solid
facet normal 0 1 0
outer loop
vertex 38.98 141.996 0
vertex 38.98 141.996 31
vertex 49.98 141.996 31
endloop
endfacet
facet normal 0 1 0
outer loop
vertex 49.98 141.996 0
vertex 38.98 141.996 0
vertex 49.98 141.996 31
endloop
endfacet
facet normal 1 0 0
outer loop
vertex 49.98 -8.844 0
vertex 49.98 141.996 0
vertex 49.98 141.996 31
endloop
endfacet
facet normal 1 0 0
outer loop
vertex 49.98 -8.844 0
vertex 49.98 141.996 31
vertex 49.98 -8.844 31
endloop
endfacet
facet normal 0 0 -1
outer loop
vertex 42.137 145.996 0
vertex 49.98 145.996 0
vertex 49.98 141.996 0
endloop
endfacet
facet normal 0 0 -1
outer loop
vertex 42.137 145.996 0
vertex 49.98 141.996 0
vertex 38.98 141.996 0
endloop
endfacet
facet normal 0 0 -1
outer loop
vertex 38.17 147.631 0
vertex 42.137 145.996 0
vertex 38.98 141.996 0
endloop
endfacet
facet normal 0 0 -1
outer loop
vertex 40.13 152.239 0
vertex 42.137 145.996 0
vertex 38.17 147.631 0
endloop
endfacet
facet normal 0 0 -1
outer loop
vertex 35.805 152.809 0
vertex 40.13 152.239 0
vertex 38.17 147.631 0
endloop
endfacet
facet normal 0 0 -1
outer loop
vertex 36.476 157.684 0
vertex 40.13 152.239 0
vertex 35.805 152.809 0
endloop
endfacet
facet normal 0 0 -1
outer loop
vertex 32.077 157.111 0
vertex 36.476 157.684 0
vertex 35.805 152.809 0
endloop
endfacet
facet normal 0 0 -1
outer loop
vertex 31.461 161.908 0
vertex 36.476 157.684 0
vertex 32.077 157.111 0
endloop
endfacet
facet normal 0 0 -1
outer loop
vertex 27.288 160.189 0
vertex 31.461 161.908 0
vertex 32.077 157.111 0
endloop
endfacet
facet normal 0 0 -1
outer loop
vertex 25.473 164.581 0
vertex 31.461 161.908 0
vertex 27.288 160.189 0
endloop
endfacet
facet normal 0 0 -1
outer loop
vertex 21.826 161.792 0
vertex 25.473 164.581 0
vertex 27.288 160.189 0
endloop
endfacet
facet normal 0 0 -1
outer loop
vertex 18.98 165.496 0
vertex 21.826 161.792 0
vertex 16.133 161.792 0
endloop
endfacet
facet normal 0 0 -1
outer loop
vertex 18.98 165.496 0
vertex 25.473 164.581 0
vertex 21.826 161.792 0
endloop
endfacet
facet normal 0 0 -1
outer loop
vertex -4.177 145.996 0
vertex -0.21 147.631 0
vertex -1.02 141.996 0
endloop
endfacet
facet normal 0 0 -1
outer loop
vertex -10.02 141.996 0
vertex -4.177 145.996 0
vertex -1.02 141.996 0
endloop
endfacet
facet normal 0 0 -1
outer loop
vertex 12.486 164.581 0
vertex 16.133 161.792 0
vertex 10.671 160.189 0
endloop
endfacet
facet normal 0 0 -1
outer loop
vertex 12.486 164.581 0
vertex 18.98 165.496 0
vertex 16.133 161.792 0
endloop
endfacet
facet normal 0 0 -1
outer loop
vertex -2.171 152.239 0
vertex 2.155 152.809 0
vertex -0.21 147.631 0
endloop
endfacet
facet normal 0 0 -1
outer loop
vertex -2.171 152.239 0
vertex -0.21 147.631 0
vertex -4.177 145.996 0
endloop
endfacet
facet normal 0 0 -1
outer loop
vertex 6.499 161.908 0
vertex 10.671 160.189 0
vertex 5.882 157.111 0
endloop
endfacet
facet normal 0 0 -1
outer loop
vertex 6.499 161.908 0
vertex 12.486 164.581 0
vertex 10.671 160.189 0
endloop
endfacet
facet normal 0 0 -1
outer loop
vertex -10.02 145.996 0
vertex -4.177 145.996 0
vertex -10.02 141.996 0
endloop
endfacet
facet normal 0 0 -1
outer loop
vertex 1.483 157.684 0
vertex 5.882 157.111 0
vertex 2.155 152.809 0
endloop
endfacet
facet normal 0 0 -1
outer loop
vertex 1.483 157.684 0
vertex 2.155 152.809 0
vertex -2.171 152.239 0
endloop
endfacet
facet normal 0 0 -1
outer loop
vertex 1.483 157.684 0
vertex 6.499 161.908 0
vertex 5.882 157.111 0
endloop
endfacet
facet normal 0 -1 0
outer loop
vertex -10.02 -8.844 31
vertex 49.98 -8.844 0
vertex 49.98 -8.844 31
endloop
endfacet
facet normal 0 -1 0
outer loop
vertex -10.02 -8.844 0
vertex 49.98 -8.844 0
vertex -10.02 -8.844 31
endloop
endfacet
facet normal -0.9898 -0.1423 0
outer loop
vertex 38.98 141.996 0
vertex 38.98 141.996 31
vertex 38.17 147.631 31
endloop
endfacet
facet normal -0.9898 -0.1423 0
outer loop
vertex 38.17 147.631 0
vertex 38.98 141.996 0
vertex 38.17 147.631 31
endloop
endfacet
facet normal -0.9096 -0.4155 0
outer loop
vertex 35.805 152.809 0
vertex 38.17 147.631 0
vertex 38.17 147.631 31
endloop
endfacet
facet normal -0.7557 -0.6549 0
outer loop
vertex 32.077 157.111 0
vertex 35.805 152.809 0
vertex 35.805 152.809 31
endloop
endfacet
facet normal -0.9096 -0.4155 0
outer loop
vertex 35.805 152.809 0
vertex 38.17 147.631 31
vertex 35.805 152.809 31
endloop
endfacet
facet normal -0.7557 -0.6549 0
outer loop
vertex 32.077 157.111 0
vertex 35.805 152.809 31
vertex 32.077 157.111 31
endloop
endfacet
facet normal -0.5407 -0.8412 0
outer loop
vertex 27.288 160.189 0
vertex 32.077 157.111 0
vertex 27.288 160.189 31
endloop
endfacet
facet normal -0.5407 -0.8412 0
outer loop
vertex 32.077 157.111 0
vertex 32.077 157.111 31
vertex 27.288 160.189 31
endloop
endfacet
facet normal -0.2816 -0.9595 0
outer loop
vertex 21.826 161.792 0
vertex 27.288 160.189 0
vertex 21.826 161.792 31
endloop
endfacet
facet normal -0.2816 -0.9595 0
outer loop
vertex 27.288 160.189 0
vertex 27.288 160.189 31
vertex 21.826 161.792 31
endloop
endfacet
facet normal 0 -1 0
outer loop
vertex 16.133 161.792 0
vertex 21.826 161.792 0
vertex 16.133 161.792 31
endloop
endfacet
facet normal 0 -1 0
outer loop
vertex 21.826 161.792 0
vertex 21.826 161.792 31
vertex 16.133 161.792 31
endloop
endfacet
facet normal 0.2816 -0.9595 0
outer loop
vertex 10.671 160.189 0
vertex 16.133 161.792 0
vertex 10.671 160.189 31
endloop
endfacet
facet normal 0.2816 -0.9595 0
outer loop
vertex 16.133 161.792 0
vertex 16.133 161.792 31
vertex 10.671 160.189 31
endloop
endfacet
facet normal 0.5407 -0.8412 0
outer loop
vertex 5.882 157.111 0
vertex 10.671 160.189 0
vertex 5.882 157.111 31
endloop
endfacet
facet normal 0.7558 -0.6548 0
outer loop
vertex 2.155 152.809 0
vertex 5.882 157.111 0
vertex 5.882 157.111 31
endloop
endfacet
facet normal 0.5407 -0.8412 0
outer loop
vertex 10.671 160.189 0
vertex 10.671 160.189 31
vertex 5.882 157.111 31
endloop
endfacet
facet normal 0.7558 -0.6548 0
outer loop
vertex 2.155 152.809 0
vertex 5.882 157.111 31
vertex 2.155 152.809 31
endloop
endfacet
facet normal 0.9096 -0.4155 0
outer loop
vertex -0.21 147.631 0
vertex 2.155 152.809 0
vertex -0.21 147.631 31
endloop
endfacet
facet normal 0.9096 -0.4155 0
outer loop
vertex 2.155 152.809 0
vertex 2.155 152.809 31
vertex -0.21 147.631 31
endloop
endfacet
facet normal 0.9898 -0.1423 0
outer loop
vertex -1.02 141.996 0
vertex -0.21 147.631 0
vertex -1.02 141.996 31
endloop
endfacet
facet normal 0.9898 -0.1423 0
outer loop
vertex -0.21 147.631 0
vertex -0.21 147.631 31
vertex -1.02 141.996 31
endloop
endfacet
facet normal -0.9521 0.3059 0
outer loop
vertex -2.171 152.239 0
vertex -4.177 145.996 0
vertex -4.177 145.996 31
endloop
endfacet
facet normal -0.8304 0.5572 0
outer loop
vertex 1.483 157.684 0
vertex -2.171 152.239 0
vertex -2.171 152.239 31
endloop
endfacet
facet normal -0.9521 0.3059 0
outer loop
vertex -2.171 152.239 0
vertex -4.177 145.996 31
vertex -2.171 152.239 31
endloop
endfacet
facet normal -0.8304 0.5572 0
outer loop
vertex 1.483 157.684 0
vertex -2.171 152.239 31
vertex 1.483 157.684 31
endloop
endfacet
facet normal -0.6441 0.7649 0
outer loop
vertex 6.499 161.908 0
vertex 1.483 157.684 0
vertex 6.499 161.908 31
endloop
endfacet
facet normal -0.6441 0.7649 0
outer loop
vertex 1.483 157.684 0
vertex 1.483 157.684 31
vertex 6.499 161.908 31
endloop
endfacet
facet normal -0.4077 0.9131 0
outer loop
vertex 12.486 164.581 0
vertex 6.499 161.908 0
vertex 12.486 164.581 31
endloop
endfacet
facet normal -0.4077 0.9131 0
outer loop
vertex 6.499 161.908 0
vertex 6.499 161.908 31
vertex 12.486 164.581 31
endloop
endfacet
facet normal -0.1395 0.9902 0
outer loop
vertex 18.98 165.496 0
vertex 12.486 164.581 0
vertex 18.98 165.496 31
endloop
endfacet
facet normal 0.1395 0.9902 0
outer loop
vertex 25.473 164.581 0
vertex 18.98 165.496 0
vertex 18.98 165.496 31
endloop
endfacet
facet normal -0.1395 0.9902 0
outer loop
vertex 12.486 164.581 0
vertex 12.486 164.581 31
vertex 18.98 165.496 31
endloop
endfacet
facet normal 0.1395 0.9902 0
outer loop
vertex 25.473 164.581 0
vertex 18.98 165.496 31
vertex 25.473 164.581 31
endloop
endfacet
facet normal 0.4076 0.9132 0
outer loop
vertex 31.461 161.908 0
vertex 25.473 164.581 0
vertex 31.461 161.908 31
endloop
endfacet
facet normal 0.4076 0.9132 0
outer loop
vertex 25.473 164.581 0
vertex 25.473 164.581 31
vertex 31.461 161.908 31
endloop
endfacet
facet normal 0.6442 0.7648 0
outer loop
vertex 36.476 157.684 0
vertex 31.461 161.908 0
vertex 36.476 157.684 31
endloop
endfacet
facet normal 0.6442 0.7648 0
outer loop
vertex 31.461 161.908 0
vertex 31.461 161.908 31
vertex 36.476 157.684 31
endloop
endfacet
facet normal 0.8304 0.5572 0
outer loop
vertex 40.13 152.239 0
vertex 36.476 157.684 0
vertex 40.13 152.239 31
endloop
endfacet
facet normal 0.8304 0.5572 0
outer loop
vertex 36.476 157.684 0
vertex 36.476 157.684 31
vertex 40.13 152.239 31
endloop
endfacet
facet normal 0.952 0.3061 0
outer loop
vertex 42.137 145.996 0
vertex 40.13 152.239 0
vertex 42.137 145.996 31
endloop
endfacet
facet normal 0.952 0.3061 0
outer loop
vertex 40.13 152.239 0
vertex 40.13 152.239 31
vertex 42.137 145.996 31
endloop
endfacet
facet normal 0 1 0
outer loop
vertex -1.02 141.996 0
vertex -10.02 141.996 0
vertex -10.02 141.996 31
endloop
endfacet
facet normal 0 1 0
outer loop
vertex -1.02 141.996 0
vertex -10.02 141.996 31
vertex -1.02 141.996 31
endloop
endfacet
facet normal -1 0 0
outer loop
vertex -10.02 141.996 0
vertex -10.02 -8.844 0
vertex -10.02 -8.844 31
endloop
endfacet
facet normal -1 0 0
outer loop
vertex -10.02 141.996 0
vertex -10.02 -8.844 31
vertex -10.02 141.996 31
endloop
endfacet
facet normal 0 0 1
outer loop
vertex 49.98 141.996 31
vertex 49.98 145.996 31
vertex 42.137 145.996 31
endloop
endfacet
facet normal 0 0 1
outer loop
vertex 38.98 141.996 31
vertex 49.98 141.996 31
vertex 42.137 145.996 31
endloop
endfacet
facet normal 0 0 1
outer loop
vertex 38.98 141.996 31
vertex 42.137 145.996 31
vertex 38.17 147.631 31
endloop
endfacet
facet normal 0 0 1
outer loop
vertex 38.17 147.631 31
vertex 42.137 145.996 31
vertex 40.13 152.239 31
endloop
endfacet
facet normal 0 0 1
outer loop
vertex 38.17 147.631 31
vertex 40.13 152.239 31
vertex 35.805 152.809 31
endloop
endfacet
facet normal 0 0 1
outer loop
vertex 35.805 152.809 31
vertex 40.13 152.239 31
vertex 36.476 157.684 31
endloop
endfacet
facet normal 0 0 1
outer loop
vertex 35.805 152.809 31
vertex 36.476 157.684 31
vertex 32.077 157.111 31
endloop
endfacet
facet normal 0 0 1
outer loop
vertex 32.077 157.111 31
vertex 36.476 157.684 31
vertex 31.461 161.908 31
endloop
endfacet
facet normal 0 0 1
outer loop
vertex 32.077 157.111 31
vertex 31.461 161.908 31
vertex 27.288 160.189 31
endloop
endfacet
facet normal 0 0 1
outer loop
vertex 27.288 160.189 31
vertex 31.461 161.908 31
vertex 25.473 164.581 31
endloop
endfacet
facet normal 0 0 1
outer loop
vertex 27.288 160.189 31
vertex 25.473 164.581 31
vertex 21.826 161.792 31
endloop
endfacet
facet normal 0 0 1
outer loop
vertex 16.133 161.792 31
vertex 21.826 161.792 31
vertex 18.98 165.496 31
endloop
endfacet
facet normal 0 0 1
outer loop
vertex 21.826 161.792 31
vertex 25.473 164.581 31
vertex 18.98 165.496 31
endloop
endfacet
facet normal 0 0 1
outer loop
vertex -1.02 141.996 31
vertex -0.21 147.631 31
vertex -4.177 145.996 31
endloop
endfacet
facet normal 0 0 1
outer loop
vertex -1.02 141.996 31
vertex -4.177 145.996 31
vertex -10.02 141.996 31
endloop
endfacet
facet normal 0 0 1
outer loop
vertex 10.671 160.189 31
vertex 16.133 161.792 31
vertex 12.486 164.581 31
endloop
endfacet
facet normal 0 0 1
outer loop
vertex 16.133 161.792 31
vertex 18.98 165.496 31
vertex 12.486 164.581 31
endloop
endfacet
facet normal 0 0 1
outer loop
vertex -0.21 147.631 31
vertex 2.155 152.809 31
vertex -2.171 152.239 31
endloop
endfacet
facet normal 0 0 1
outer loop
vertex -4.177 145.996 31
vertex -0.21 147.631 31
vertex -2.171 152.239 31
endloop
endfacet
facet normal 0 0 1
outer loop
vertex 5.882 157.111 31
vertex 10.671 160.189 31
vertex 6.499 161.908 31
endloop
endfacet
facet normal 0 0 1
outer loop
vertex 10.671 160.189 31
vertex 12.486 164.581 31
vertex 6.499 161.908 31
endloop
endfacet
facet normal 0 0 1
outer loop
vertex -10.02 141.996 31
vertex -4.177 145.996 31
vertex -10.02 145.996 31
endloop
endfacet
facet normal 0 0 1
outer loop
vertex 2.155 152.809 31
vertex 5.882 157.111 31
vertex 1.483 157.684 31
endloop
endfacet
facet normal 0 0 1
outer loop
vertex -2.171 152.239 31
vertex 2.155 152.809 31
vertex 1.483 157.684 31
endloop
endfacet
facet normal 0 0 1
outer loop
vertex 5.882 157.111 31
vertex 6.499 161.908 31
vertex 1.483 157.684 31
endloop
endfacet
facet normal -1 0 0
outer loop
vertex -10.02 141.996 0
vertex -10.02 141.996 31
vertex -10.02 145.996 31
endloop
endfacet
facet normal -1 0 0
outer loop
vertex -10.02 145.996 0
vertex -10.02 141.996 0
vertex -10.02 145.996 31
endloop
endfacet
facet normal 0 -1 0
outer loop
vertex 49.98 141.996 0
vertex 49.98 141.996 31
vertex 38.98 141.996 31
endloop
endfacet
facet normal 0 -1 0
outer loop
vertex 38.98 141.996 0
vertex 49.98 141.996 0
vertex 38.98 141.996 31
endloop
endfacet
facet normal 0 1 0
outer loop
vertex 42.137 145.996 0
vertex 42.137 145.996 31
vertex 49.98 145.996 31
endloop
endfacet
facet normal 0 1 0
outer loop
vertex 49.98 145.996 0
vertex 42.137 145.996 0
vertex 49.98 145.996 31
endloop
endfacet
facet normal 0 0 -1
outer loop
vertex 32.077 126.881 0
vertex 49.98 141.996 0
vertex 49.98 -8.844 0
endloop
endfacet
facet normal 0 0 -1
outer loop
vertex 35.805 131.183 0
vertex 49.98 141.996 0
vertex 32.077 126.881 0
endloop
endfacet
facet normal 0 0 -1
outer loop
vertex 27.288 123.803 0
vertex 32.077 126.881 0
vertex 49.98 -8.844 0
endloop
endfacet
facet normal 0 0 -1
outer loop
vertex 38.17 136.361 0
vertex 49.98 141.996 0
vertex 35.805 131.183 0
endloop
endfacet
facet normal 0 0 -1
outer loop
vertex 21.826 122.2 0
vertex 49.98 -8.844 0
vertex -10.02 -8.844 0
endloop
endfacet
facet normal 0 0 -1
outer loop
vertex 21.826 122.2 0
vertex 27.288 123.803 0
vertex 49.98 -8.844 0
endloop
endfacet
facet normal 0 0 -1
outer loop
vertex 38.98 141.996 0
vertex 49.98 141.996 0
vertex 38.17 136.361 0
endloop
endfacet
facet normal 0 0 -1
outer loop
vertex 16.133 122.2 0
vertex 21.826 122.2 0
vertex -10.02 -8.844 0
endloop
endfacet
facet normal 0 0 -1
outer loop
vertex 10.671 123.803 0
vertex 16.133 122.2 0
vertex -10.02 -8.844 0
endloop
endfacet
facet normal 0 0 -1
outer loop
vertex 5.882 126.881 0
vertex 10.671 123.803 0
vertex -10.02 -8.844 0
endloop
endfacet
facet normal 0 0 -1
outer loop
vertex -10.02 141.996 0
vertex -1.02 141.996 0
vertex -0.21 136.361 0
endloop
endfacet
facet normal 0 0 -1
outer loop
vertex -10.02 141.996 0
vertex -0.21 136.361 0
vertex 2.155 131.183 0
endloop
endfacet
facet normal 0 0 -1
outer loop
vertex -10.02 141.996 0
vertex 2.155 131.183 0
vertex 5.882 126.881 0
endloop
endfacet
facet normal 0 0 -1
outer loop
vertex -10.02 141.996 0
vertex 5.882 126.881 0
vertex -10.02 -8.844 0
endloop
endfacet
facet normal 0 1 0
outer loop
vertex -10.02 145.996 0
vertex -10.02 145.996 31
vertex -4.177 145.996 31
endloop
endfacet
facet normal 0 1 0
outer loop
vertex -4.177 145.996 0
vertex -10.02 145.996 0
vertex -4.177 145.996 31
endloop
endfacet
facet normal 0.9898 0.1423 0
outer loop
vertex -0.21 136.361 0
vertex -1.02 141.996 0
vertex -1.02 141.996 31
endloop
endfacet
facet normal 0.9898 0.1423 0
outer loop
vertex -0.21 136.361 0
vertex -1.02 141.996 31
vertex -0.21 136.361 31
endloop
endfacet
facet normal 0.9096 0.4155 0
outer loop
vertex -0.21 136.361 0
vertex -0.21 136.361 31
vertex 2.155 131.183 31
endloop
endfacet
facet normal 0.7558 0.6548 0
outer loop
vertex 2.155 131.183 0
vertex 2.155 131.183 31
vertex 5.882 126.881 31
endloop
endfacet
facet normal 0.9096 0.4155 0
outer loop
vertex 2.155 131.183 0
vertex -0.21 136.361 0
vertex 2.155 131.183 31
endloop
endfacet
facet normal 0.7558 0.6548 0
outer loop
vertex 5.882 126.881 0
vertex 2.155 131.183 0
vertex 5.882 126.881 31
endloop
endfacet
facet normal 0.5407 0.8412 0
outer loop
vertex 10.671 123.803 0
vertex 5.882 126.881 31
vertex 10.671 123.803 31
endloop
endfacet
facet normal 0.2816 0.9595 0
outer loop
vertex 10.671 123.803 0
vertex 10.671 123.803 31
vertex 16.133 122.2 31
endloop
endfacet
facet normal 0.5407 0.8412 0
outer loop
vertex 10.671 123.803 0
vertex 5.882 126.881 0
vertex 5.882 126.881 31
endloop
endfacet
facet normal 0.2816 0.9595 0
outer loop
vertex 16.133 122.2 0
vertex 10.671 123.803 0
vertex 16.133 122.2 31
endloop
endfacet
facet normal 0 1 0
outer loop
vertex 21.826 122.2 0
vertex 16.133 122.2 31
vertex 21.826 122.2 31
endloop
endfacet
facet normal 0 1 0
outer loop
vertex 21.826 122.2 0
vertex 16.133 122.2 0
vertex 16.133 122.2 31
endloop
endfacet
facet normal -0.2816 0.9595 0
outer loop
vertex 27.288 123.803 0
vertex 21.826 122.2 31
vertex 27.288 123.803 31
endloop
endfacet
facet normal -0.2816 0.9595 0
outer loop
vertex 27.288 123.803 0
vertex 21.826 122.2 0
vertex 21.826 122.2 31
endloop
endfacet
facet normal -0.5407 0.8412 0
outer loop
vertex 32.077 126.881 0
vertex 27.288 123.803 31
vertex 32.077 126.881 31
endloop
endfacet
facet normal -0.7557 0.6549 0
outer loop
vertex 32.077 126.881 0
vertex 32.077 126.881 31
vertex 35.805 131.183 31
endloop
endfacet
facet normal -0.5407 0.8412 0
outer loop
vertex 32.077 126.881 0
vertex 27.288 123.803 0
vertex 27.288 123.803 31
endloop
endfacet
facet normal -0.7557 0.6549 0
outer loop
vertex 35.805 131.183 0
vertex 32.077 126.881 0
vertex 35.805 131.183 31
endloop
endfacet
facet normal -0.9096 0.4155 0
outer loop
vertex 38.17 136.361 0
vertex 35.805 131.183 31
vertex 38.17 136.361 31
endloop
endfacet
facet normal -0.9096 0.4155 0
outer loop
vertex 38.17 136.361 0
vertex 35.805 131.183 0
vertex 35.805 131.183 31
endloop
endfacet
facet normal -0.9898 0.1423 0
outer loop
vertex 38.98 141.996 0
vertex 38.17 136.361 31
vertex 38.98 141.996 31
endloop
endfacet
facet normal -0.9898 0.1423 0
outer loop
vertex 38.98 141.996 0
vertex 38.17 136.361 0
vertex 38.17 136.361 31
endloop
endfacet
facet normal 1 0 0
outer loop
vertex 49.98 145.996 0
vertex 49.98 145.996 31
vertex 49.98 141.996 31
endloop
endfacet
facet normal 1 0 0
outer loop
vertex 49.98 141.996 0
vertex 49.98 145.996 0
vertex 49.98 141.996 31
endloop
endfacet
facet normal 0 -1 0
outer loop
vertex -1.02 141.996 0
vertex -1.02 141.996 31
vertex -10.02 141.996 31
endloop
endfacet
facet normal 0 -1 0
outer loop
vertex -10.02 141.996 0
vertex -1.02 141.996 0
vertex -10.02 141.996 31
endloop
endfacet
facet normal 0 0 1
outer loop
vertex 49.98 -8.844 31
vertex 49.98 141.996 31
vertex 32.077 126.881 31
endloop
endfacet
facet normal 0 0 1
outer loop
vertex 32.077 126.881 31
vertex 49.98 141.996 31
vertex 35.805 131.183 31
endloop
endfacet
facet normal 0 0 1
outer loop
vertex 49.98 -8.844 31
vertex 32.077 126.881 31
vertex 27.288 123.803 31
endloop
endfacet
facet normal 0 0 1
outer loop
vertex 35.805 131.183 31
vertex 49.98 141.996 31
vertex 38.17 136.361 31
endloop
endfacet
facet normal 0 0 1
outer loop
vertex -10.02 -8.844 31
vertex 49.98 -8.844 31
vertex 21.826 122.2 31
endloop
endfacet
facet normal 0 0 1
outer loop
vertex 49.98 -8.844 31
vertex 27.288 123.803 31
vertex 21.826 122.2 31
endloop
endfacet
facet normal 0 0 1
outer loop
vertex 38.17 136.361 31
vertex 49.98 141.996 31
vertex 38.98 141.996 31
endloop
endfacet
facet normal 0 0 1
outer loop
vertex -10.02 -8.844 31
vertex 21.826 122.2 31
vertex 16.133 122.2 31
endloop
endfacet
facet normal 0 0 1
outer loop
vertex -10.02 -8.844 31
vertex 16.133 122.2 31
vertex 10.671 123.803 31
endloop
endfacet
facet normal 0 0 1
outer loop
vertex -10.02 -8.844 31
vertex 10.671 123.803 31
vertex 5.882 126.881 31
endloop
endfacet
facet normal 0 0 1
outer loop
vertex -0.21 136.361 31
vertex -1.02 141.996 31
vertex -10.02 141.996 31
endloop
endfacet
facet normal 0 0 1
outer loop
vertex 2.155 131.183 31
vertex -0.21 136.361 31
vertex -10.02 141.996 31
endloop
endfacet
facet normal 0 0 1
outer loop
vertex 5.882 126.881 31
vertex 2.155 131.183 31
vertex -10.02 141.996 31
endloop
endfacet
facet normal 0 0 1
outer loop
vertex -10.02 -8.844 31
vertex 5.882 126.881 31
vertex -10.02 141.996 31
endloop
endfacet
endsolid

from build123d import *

# Parameters (mm, degrees)
BOSS_EXTRUDE1_DEPTH = 31
BOSS_EXTRUDE2_DEPTH = 31


with BuildPart() as part:
    # Sketch1 → Boss-Extrude1 (new body)
    with BuildSketch(Plane.XY):
        with BuildLine():
            Line((38.979674797, 141.995934959), (49.979674797, 141.995934959))
            Line((49.979674797, 141.995934959), (49.979674797, -8.844065041))
            Line((49.979674797, -8.844065041), (-10.020325203, -8.844065041))
            Line((-10.020325203, -8.844065041), (-10.020325203, 141.995934959))
            Line((-10.020325203, 141.995934959), (-1.020325203, 141.995934959))
            ThreePointArc((-1.020325203, 141.995934959), (18.979674797, 121.995934959), (38.979674797, 141.995934959))
        make_face()
    extrude(amount=BOSS_EXTRUDE1_DEPTH)


with BuildPart() as body_2:
    # Sketch2 → Boss-Extrude2 (new body)
    with BuildSketch(Plane.XY.offset(31)):
        with BuildLine():
            Line((-10.020325203, 141.995934959), (-10.020325203, 145.995934959))
            Line((-10.020325203, 145.995934959), (-4.177397557, 145.995934959))
            ThreePointArc((-4.177397557, 145.995934959), (18.979674797, 165.495934959), (42.136747151, 145.995934959))
            Line((42.136747151, 145.995934959), (49.979674797, 145.995934959))
            Line((49.979674797, 145.995934959), (49.979674797, 141.995934959))
            Line((49.979674797, 141.995934959), (38.979674797, 141.995934959))
            ThreePointArc((38.979674797, 141.995934959), (18.979674797, 161.995934959), (-1.020325203, 141.995934959))
            Line((-1.020325203, 141.995934959), (-10.020325203, 141.995934959))
        make_face()
    extrude(amount=-BOSS_EXTRUDE2_DEPTH)


solid = Compound([part.part, body_2.part])
